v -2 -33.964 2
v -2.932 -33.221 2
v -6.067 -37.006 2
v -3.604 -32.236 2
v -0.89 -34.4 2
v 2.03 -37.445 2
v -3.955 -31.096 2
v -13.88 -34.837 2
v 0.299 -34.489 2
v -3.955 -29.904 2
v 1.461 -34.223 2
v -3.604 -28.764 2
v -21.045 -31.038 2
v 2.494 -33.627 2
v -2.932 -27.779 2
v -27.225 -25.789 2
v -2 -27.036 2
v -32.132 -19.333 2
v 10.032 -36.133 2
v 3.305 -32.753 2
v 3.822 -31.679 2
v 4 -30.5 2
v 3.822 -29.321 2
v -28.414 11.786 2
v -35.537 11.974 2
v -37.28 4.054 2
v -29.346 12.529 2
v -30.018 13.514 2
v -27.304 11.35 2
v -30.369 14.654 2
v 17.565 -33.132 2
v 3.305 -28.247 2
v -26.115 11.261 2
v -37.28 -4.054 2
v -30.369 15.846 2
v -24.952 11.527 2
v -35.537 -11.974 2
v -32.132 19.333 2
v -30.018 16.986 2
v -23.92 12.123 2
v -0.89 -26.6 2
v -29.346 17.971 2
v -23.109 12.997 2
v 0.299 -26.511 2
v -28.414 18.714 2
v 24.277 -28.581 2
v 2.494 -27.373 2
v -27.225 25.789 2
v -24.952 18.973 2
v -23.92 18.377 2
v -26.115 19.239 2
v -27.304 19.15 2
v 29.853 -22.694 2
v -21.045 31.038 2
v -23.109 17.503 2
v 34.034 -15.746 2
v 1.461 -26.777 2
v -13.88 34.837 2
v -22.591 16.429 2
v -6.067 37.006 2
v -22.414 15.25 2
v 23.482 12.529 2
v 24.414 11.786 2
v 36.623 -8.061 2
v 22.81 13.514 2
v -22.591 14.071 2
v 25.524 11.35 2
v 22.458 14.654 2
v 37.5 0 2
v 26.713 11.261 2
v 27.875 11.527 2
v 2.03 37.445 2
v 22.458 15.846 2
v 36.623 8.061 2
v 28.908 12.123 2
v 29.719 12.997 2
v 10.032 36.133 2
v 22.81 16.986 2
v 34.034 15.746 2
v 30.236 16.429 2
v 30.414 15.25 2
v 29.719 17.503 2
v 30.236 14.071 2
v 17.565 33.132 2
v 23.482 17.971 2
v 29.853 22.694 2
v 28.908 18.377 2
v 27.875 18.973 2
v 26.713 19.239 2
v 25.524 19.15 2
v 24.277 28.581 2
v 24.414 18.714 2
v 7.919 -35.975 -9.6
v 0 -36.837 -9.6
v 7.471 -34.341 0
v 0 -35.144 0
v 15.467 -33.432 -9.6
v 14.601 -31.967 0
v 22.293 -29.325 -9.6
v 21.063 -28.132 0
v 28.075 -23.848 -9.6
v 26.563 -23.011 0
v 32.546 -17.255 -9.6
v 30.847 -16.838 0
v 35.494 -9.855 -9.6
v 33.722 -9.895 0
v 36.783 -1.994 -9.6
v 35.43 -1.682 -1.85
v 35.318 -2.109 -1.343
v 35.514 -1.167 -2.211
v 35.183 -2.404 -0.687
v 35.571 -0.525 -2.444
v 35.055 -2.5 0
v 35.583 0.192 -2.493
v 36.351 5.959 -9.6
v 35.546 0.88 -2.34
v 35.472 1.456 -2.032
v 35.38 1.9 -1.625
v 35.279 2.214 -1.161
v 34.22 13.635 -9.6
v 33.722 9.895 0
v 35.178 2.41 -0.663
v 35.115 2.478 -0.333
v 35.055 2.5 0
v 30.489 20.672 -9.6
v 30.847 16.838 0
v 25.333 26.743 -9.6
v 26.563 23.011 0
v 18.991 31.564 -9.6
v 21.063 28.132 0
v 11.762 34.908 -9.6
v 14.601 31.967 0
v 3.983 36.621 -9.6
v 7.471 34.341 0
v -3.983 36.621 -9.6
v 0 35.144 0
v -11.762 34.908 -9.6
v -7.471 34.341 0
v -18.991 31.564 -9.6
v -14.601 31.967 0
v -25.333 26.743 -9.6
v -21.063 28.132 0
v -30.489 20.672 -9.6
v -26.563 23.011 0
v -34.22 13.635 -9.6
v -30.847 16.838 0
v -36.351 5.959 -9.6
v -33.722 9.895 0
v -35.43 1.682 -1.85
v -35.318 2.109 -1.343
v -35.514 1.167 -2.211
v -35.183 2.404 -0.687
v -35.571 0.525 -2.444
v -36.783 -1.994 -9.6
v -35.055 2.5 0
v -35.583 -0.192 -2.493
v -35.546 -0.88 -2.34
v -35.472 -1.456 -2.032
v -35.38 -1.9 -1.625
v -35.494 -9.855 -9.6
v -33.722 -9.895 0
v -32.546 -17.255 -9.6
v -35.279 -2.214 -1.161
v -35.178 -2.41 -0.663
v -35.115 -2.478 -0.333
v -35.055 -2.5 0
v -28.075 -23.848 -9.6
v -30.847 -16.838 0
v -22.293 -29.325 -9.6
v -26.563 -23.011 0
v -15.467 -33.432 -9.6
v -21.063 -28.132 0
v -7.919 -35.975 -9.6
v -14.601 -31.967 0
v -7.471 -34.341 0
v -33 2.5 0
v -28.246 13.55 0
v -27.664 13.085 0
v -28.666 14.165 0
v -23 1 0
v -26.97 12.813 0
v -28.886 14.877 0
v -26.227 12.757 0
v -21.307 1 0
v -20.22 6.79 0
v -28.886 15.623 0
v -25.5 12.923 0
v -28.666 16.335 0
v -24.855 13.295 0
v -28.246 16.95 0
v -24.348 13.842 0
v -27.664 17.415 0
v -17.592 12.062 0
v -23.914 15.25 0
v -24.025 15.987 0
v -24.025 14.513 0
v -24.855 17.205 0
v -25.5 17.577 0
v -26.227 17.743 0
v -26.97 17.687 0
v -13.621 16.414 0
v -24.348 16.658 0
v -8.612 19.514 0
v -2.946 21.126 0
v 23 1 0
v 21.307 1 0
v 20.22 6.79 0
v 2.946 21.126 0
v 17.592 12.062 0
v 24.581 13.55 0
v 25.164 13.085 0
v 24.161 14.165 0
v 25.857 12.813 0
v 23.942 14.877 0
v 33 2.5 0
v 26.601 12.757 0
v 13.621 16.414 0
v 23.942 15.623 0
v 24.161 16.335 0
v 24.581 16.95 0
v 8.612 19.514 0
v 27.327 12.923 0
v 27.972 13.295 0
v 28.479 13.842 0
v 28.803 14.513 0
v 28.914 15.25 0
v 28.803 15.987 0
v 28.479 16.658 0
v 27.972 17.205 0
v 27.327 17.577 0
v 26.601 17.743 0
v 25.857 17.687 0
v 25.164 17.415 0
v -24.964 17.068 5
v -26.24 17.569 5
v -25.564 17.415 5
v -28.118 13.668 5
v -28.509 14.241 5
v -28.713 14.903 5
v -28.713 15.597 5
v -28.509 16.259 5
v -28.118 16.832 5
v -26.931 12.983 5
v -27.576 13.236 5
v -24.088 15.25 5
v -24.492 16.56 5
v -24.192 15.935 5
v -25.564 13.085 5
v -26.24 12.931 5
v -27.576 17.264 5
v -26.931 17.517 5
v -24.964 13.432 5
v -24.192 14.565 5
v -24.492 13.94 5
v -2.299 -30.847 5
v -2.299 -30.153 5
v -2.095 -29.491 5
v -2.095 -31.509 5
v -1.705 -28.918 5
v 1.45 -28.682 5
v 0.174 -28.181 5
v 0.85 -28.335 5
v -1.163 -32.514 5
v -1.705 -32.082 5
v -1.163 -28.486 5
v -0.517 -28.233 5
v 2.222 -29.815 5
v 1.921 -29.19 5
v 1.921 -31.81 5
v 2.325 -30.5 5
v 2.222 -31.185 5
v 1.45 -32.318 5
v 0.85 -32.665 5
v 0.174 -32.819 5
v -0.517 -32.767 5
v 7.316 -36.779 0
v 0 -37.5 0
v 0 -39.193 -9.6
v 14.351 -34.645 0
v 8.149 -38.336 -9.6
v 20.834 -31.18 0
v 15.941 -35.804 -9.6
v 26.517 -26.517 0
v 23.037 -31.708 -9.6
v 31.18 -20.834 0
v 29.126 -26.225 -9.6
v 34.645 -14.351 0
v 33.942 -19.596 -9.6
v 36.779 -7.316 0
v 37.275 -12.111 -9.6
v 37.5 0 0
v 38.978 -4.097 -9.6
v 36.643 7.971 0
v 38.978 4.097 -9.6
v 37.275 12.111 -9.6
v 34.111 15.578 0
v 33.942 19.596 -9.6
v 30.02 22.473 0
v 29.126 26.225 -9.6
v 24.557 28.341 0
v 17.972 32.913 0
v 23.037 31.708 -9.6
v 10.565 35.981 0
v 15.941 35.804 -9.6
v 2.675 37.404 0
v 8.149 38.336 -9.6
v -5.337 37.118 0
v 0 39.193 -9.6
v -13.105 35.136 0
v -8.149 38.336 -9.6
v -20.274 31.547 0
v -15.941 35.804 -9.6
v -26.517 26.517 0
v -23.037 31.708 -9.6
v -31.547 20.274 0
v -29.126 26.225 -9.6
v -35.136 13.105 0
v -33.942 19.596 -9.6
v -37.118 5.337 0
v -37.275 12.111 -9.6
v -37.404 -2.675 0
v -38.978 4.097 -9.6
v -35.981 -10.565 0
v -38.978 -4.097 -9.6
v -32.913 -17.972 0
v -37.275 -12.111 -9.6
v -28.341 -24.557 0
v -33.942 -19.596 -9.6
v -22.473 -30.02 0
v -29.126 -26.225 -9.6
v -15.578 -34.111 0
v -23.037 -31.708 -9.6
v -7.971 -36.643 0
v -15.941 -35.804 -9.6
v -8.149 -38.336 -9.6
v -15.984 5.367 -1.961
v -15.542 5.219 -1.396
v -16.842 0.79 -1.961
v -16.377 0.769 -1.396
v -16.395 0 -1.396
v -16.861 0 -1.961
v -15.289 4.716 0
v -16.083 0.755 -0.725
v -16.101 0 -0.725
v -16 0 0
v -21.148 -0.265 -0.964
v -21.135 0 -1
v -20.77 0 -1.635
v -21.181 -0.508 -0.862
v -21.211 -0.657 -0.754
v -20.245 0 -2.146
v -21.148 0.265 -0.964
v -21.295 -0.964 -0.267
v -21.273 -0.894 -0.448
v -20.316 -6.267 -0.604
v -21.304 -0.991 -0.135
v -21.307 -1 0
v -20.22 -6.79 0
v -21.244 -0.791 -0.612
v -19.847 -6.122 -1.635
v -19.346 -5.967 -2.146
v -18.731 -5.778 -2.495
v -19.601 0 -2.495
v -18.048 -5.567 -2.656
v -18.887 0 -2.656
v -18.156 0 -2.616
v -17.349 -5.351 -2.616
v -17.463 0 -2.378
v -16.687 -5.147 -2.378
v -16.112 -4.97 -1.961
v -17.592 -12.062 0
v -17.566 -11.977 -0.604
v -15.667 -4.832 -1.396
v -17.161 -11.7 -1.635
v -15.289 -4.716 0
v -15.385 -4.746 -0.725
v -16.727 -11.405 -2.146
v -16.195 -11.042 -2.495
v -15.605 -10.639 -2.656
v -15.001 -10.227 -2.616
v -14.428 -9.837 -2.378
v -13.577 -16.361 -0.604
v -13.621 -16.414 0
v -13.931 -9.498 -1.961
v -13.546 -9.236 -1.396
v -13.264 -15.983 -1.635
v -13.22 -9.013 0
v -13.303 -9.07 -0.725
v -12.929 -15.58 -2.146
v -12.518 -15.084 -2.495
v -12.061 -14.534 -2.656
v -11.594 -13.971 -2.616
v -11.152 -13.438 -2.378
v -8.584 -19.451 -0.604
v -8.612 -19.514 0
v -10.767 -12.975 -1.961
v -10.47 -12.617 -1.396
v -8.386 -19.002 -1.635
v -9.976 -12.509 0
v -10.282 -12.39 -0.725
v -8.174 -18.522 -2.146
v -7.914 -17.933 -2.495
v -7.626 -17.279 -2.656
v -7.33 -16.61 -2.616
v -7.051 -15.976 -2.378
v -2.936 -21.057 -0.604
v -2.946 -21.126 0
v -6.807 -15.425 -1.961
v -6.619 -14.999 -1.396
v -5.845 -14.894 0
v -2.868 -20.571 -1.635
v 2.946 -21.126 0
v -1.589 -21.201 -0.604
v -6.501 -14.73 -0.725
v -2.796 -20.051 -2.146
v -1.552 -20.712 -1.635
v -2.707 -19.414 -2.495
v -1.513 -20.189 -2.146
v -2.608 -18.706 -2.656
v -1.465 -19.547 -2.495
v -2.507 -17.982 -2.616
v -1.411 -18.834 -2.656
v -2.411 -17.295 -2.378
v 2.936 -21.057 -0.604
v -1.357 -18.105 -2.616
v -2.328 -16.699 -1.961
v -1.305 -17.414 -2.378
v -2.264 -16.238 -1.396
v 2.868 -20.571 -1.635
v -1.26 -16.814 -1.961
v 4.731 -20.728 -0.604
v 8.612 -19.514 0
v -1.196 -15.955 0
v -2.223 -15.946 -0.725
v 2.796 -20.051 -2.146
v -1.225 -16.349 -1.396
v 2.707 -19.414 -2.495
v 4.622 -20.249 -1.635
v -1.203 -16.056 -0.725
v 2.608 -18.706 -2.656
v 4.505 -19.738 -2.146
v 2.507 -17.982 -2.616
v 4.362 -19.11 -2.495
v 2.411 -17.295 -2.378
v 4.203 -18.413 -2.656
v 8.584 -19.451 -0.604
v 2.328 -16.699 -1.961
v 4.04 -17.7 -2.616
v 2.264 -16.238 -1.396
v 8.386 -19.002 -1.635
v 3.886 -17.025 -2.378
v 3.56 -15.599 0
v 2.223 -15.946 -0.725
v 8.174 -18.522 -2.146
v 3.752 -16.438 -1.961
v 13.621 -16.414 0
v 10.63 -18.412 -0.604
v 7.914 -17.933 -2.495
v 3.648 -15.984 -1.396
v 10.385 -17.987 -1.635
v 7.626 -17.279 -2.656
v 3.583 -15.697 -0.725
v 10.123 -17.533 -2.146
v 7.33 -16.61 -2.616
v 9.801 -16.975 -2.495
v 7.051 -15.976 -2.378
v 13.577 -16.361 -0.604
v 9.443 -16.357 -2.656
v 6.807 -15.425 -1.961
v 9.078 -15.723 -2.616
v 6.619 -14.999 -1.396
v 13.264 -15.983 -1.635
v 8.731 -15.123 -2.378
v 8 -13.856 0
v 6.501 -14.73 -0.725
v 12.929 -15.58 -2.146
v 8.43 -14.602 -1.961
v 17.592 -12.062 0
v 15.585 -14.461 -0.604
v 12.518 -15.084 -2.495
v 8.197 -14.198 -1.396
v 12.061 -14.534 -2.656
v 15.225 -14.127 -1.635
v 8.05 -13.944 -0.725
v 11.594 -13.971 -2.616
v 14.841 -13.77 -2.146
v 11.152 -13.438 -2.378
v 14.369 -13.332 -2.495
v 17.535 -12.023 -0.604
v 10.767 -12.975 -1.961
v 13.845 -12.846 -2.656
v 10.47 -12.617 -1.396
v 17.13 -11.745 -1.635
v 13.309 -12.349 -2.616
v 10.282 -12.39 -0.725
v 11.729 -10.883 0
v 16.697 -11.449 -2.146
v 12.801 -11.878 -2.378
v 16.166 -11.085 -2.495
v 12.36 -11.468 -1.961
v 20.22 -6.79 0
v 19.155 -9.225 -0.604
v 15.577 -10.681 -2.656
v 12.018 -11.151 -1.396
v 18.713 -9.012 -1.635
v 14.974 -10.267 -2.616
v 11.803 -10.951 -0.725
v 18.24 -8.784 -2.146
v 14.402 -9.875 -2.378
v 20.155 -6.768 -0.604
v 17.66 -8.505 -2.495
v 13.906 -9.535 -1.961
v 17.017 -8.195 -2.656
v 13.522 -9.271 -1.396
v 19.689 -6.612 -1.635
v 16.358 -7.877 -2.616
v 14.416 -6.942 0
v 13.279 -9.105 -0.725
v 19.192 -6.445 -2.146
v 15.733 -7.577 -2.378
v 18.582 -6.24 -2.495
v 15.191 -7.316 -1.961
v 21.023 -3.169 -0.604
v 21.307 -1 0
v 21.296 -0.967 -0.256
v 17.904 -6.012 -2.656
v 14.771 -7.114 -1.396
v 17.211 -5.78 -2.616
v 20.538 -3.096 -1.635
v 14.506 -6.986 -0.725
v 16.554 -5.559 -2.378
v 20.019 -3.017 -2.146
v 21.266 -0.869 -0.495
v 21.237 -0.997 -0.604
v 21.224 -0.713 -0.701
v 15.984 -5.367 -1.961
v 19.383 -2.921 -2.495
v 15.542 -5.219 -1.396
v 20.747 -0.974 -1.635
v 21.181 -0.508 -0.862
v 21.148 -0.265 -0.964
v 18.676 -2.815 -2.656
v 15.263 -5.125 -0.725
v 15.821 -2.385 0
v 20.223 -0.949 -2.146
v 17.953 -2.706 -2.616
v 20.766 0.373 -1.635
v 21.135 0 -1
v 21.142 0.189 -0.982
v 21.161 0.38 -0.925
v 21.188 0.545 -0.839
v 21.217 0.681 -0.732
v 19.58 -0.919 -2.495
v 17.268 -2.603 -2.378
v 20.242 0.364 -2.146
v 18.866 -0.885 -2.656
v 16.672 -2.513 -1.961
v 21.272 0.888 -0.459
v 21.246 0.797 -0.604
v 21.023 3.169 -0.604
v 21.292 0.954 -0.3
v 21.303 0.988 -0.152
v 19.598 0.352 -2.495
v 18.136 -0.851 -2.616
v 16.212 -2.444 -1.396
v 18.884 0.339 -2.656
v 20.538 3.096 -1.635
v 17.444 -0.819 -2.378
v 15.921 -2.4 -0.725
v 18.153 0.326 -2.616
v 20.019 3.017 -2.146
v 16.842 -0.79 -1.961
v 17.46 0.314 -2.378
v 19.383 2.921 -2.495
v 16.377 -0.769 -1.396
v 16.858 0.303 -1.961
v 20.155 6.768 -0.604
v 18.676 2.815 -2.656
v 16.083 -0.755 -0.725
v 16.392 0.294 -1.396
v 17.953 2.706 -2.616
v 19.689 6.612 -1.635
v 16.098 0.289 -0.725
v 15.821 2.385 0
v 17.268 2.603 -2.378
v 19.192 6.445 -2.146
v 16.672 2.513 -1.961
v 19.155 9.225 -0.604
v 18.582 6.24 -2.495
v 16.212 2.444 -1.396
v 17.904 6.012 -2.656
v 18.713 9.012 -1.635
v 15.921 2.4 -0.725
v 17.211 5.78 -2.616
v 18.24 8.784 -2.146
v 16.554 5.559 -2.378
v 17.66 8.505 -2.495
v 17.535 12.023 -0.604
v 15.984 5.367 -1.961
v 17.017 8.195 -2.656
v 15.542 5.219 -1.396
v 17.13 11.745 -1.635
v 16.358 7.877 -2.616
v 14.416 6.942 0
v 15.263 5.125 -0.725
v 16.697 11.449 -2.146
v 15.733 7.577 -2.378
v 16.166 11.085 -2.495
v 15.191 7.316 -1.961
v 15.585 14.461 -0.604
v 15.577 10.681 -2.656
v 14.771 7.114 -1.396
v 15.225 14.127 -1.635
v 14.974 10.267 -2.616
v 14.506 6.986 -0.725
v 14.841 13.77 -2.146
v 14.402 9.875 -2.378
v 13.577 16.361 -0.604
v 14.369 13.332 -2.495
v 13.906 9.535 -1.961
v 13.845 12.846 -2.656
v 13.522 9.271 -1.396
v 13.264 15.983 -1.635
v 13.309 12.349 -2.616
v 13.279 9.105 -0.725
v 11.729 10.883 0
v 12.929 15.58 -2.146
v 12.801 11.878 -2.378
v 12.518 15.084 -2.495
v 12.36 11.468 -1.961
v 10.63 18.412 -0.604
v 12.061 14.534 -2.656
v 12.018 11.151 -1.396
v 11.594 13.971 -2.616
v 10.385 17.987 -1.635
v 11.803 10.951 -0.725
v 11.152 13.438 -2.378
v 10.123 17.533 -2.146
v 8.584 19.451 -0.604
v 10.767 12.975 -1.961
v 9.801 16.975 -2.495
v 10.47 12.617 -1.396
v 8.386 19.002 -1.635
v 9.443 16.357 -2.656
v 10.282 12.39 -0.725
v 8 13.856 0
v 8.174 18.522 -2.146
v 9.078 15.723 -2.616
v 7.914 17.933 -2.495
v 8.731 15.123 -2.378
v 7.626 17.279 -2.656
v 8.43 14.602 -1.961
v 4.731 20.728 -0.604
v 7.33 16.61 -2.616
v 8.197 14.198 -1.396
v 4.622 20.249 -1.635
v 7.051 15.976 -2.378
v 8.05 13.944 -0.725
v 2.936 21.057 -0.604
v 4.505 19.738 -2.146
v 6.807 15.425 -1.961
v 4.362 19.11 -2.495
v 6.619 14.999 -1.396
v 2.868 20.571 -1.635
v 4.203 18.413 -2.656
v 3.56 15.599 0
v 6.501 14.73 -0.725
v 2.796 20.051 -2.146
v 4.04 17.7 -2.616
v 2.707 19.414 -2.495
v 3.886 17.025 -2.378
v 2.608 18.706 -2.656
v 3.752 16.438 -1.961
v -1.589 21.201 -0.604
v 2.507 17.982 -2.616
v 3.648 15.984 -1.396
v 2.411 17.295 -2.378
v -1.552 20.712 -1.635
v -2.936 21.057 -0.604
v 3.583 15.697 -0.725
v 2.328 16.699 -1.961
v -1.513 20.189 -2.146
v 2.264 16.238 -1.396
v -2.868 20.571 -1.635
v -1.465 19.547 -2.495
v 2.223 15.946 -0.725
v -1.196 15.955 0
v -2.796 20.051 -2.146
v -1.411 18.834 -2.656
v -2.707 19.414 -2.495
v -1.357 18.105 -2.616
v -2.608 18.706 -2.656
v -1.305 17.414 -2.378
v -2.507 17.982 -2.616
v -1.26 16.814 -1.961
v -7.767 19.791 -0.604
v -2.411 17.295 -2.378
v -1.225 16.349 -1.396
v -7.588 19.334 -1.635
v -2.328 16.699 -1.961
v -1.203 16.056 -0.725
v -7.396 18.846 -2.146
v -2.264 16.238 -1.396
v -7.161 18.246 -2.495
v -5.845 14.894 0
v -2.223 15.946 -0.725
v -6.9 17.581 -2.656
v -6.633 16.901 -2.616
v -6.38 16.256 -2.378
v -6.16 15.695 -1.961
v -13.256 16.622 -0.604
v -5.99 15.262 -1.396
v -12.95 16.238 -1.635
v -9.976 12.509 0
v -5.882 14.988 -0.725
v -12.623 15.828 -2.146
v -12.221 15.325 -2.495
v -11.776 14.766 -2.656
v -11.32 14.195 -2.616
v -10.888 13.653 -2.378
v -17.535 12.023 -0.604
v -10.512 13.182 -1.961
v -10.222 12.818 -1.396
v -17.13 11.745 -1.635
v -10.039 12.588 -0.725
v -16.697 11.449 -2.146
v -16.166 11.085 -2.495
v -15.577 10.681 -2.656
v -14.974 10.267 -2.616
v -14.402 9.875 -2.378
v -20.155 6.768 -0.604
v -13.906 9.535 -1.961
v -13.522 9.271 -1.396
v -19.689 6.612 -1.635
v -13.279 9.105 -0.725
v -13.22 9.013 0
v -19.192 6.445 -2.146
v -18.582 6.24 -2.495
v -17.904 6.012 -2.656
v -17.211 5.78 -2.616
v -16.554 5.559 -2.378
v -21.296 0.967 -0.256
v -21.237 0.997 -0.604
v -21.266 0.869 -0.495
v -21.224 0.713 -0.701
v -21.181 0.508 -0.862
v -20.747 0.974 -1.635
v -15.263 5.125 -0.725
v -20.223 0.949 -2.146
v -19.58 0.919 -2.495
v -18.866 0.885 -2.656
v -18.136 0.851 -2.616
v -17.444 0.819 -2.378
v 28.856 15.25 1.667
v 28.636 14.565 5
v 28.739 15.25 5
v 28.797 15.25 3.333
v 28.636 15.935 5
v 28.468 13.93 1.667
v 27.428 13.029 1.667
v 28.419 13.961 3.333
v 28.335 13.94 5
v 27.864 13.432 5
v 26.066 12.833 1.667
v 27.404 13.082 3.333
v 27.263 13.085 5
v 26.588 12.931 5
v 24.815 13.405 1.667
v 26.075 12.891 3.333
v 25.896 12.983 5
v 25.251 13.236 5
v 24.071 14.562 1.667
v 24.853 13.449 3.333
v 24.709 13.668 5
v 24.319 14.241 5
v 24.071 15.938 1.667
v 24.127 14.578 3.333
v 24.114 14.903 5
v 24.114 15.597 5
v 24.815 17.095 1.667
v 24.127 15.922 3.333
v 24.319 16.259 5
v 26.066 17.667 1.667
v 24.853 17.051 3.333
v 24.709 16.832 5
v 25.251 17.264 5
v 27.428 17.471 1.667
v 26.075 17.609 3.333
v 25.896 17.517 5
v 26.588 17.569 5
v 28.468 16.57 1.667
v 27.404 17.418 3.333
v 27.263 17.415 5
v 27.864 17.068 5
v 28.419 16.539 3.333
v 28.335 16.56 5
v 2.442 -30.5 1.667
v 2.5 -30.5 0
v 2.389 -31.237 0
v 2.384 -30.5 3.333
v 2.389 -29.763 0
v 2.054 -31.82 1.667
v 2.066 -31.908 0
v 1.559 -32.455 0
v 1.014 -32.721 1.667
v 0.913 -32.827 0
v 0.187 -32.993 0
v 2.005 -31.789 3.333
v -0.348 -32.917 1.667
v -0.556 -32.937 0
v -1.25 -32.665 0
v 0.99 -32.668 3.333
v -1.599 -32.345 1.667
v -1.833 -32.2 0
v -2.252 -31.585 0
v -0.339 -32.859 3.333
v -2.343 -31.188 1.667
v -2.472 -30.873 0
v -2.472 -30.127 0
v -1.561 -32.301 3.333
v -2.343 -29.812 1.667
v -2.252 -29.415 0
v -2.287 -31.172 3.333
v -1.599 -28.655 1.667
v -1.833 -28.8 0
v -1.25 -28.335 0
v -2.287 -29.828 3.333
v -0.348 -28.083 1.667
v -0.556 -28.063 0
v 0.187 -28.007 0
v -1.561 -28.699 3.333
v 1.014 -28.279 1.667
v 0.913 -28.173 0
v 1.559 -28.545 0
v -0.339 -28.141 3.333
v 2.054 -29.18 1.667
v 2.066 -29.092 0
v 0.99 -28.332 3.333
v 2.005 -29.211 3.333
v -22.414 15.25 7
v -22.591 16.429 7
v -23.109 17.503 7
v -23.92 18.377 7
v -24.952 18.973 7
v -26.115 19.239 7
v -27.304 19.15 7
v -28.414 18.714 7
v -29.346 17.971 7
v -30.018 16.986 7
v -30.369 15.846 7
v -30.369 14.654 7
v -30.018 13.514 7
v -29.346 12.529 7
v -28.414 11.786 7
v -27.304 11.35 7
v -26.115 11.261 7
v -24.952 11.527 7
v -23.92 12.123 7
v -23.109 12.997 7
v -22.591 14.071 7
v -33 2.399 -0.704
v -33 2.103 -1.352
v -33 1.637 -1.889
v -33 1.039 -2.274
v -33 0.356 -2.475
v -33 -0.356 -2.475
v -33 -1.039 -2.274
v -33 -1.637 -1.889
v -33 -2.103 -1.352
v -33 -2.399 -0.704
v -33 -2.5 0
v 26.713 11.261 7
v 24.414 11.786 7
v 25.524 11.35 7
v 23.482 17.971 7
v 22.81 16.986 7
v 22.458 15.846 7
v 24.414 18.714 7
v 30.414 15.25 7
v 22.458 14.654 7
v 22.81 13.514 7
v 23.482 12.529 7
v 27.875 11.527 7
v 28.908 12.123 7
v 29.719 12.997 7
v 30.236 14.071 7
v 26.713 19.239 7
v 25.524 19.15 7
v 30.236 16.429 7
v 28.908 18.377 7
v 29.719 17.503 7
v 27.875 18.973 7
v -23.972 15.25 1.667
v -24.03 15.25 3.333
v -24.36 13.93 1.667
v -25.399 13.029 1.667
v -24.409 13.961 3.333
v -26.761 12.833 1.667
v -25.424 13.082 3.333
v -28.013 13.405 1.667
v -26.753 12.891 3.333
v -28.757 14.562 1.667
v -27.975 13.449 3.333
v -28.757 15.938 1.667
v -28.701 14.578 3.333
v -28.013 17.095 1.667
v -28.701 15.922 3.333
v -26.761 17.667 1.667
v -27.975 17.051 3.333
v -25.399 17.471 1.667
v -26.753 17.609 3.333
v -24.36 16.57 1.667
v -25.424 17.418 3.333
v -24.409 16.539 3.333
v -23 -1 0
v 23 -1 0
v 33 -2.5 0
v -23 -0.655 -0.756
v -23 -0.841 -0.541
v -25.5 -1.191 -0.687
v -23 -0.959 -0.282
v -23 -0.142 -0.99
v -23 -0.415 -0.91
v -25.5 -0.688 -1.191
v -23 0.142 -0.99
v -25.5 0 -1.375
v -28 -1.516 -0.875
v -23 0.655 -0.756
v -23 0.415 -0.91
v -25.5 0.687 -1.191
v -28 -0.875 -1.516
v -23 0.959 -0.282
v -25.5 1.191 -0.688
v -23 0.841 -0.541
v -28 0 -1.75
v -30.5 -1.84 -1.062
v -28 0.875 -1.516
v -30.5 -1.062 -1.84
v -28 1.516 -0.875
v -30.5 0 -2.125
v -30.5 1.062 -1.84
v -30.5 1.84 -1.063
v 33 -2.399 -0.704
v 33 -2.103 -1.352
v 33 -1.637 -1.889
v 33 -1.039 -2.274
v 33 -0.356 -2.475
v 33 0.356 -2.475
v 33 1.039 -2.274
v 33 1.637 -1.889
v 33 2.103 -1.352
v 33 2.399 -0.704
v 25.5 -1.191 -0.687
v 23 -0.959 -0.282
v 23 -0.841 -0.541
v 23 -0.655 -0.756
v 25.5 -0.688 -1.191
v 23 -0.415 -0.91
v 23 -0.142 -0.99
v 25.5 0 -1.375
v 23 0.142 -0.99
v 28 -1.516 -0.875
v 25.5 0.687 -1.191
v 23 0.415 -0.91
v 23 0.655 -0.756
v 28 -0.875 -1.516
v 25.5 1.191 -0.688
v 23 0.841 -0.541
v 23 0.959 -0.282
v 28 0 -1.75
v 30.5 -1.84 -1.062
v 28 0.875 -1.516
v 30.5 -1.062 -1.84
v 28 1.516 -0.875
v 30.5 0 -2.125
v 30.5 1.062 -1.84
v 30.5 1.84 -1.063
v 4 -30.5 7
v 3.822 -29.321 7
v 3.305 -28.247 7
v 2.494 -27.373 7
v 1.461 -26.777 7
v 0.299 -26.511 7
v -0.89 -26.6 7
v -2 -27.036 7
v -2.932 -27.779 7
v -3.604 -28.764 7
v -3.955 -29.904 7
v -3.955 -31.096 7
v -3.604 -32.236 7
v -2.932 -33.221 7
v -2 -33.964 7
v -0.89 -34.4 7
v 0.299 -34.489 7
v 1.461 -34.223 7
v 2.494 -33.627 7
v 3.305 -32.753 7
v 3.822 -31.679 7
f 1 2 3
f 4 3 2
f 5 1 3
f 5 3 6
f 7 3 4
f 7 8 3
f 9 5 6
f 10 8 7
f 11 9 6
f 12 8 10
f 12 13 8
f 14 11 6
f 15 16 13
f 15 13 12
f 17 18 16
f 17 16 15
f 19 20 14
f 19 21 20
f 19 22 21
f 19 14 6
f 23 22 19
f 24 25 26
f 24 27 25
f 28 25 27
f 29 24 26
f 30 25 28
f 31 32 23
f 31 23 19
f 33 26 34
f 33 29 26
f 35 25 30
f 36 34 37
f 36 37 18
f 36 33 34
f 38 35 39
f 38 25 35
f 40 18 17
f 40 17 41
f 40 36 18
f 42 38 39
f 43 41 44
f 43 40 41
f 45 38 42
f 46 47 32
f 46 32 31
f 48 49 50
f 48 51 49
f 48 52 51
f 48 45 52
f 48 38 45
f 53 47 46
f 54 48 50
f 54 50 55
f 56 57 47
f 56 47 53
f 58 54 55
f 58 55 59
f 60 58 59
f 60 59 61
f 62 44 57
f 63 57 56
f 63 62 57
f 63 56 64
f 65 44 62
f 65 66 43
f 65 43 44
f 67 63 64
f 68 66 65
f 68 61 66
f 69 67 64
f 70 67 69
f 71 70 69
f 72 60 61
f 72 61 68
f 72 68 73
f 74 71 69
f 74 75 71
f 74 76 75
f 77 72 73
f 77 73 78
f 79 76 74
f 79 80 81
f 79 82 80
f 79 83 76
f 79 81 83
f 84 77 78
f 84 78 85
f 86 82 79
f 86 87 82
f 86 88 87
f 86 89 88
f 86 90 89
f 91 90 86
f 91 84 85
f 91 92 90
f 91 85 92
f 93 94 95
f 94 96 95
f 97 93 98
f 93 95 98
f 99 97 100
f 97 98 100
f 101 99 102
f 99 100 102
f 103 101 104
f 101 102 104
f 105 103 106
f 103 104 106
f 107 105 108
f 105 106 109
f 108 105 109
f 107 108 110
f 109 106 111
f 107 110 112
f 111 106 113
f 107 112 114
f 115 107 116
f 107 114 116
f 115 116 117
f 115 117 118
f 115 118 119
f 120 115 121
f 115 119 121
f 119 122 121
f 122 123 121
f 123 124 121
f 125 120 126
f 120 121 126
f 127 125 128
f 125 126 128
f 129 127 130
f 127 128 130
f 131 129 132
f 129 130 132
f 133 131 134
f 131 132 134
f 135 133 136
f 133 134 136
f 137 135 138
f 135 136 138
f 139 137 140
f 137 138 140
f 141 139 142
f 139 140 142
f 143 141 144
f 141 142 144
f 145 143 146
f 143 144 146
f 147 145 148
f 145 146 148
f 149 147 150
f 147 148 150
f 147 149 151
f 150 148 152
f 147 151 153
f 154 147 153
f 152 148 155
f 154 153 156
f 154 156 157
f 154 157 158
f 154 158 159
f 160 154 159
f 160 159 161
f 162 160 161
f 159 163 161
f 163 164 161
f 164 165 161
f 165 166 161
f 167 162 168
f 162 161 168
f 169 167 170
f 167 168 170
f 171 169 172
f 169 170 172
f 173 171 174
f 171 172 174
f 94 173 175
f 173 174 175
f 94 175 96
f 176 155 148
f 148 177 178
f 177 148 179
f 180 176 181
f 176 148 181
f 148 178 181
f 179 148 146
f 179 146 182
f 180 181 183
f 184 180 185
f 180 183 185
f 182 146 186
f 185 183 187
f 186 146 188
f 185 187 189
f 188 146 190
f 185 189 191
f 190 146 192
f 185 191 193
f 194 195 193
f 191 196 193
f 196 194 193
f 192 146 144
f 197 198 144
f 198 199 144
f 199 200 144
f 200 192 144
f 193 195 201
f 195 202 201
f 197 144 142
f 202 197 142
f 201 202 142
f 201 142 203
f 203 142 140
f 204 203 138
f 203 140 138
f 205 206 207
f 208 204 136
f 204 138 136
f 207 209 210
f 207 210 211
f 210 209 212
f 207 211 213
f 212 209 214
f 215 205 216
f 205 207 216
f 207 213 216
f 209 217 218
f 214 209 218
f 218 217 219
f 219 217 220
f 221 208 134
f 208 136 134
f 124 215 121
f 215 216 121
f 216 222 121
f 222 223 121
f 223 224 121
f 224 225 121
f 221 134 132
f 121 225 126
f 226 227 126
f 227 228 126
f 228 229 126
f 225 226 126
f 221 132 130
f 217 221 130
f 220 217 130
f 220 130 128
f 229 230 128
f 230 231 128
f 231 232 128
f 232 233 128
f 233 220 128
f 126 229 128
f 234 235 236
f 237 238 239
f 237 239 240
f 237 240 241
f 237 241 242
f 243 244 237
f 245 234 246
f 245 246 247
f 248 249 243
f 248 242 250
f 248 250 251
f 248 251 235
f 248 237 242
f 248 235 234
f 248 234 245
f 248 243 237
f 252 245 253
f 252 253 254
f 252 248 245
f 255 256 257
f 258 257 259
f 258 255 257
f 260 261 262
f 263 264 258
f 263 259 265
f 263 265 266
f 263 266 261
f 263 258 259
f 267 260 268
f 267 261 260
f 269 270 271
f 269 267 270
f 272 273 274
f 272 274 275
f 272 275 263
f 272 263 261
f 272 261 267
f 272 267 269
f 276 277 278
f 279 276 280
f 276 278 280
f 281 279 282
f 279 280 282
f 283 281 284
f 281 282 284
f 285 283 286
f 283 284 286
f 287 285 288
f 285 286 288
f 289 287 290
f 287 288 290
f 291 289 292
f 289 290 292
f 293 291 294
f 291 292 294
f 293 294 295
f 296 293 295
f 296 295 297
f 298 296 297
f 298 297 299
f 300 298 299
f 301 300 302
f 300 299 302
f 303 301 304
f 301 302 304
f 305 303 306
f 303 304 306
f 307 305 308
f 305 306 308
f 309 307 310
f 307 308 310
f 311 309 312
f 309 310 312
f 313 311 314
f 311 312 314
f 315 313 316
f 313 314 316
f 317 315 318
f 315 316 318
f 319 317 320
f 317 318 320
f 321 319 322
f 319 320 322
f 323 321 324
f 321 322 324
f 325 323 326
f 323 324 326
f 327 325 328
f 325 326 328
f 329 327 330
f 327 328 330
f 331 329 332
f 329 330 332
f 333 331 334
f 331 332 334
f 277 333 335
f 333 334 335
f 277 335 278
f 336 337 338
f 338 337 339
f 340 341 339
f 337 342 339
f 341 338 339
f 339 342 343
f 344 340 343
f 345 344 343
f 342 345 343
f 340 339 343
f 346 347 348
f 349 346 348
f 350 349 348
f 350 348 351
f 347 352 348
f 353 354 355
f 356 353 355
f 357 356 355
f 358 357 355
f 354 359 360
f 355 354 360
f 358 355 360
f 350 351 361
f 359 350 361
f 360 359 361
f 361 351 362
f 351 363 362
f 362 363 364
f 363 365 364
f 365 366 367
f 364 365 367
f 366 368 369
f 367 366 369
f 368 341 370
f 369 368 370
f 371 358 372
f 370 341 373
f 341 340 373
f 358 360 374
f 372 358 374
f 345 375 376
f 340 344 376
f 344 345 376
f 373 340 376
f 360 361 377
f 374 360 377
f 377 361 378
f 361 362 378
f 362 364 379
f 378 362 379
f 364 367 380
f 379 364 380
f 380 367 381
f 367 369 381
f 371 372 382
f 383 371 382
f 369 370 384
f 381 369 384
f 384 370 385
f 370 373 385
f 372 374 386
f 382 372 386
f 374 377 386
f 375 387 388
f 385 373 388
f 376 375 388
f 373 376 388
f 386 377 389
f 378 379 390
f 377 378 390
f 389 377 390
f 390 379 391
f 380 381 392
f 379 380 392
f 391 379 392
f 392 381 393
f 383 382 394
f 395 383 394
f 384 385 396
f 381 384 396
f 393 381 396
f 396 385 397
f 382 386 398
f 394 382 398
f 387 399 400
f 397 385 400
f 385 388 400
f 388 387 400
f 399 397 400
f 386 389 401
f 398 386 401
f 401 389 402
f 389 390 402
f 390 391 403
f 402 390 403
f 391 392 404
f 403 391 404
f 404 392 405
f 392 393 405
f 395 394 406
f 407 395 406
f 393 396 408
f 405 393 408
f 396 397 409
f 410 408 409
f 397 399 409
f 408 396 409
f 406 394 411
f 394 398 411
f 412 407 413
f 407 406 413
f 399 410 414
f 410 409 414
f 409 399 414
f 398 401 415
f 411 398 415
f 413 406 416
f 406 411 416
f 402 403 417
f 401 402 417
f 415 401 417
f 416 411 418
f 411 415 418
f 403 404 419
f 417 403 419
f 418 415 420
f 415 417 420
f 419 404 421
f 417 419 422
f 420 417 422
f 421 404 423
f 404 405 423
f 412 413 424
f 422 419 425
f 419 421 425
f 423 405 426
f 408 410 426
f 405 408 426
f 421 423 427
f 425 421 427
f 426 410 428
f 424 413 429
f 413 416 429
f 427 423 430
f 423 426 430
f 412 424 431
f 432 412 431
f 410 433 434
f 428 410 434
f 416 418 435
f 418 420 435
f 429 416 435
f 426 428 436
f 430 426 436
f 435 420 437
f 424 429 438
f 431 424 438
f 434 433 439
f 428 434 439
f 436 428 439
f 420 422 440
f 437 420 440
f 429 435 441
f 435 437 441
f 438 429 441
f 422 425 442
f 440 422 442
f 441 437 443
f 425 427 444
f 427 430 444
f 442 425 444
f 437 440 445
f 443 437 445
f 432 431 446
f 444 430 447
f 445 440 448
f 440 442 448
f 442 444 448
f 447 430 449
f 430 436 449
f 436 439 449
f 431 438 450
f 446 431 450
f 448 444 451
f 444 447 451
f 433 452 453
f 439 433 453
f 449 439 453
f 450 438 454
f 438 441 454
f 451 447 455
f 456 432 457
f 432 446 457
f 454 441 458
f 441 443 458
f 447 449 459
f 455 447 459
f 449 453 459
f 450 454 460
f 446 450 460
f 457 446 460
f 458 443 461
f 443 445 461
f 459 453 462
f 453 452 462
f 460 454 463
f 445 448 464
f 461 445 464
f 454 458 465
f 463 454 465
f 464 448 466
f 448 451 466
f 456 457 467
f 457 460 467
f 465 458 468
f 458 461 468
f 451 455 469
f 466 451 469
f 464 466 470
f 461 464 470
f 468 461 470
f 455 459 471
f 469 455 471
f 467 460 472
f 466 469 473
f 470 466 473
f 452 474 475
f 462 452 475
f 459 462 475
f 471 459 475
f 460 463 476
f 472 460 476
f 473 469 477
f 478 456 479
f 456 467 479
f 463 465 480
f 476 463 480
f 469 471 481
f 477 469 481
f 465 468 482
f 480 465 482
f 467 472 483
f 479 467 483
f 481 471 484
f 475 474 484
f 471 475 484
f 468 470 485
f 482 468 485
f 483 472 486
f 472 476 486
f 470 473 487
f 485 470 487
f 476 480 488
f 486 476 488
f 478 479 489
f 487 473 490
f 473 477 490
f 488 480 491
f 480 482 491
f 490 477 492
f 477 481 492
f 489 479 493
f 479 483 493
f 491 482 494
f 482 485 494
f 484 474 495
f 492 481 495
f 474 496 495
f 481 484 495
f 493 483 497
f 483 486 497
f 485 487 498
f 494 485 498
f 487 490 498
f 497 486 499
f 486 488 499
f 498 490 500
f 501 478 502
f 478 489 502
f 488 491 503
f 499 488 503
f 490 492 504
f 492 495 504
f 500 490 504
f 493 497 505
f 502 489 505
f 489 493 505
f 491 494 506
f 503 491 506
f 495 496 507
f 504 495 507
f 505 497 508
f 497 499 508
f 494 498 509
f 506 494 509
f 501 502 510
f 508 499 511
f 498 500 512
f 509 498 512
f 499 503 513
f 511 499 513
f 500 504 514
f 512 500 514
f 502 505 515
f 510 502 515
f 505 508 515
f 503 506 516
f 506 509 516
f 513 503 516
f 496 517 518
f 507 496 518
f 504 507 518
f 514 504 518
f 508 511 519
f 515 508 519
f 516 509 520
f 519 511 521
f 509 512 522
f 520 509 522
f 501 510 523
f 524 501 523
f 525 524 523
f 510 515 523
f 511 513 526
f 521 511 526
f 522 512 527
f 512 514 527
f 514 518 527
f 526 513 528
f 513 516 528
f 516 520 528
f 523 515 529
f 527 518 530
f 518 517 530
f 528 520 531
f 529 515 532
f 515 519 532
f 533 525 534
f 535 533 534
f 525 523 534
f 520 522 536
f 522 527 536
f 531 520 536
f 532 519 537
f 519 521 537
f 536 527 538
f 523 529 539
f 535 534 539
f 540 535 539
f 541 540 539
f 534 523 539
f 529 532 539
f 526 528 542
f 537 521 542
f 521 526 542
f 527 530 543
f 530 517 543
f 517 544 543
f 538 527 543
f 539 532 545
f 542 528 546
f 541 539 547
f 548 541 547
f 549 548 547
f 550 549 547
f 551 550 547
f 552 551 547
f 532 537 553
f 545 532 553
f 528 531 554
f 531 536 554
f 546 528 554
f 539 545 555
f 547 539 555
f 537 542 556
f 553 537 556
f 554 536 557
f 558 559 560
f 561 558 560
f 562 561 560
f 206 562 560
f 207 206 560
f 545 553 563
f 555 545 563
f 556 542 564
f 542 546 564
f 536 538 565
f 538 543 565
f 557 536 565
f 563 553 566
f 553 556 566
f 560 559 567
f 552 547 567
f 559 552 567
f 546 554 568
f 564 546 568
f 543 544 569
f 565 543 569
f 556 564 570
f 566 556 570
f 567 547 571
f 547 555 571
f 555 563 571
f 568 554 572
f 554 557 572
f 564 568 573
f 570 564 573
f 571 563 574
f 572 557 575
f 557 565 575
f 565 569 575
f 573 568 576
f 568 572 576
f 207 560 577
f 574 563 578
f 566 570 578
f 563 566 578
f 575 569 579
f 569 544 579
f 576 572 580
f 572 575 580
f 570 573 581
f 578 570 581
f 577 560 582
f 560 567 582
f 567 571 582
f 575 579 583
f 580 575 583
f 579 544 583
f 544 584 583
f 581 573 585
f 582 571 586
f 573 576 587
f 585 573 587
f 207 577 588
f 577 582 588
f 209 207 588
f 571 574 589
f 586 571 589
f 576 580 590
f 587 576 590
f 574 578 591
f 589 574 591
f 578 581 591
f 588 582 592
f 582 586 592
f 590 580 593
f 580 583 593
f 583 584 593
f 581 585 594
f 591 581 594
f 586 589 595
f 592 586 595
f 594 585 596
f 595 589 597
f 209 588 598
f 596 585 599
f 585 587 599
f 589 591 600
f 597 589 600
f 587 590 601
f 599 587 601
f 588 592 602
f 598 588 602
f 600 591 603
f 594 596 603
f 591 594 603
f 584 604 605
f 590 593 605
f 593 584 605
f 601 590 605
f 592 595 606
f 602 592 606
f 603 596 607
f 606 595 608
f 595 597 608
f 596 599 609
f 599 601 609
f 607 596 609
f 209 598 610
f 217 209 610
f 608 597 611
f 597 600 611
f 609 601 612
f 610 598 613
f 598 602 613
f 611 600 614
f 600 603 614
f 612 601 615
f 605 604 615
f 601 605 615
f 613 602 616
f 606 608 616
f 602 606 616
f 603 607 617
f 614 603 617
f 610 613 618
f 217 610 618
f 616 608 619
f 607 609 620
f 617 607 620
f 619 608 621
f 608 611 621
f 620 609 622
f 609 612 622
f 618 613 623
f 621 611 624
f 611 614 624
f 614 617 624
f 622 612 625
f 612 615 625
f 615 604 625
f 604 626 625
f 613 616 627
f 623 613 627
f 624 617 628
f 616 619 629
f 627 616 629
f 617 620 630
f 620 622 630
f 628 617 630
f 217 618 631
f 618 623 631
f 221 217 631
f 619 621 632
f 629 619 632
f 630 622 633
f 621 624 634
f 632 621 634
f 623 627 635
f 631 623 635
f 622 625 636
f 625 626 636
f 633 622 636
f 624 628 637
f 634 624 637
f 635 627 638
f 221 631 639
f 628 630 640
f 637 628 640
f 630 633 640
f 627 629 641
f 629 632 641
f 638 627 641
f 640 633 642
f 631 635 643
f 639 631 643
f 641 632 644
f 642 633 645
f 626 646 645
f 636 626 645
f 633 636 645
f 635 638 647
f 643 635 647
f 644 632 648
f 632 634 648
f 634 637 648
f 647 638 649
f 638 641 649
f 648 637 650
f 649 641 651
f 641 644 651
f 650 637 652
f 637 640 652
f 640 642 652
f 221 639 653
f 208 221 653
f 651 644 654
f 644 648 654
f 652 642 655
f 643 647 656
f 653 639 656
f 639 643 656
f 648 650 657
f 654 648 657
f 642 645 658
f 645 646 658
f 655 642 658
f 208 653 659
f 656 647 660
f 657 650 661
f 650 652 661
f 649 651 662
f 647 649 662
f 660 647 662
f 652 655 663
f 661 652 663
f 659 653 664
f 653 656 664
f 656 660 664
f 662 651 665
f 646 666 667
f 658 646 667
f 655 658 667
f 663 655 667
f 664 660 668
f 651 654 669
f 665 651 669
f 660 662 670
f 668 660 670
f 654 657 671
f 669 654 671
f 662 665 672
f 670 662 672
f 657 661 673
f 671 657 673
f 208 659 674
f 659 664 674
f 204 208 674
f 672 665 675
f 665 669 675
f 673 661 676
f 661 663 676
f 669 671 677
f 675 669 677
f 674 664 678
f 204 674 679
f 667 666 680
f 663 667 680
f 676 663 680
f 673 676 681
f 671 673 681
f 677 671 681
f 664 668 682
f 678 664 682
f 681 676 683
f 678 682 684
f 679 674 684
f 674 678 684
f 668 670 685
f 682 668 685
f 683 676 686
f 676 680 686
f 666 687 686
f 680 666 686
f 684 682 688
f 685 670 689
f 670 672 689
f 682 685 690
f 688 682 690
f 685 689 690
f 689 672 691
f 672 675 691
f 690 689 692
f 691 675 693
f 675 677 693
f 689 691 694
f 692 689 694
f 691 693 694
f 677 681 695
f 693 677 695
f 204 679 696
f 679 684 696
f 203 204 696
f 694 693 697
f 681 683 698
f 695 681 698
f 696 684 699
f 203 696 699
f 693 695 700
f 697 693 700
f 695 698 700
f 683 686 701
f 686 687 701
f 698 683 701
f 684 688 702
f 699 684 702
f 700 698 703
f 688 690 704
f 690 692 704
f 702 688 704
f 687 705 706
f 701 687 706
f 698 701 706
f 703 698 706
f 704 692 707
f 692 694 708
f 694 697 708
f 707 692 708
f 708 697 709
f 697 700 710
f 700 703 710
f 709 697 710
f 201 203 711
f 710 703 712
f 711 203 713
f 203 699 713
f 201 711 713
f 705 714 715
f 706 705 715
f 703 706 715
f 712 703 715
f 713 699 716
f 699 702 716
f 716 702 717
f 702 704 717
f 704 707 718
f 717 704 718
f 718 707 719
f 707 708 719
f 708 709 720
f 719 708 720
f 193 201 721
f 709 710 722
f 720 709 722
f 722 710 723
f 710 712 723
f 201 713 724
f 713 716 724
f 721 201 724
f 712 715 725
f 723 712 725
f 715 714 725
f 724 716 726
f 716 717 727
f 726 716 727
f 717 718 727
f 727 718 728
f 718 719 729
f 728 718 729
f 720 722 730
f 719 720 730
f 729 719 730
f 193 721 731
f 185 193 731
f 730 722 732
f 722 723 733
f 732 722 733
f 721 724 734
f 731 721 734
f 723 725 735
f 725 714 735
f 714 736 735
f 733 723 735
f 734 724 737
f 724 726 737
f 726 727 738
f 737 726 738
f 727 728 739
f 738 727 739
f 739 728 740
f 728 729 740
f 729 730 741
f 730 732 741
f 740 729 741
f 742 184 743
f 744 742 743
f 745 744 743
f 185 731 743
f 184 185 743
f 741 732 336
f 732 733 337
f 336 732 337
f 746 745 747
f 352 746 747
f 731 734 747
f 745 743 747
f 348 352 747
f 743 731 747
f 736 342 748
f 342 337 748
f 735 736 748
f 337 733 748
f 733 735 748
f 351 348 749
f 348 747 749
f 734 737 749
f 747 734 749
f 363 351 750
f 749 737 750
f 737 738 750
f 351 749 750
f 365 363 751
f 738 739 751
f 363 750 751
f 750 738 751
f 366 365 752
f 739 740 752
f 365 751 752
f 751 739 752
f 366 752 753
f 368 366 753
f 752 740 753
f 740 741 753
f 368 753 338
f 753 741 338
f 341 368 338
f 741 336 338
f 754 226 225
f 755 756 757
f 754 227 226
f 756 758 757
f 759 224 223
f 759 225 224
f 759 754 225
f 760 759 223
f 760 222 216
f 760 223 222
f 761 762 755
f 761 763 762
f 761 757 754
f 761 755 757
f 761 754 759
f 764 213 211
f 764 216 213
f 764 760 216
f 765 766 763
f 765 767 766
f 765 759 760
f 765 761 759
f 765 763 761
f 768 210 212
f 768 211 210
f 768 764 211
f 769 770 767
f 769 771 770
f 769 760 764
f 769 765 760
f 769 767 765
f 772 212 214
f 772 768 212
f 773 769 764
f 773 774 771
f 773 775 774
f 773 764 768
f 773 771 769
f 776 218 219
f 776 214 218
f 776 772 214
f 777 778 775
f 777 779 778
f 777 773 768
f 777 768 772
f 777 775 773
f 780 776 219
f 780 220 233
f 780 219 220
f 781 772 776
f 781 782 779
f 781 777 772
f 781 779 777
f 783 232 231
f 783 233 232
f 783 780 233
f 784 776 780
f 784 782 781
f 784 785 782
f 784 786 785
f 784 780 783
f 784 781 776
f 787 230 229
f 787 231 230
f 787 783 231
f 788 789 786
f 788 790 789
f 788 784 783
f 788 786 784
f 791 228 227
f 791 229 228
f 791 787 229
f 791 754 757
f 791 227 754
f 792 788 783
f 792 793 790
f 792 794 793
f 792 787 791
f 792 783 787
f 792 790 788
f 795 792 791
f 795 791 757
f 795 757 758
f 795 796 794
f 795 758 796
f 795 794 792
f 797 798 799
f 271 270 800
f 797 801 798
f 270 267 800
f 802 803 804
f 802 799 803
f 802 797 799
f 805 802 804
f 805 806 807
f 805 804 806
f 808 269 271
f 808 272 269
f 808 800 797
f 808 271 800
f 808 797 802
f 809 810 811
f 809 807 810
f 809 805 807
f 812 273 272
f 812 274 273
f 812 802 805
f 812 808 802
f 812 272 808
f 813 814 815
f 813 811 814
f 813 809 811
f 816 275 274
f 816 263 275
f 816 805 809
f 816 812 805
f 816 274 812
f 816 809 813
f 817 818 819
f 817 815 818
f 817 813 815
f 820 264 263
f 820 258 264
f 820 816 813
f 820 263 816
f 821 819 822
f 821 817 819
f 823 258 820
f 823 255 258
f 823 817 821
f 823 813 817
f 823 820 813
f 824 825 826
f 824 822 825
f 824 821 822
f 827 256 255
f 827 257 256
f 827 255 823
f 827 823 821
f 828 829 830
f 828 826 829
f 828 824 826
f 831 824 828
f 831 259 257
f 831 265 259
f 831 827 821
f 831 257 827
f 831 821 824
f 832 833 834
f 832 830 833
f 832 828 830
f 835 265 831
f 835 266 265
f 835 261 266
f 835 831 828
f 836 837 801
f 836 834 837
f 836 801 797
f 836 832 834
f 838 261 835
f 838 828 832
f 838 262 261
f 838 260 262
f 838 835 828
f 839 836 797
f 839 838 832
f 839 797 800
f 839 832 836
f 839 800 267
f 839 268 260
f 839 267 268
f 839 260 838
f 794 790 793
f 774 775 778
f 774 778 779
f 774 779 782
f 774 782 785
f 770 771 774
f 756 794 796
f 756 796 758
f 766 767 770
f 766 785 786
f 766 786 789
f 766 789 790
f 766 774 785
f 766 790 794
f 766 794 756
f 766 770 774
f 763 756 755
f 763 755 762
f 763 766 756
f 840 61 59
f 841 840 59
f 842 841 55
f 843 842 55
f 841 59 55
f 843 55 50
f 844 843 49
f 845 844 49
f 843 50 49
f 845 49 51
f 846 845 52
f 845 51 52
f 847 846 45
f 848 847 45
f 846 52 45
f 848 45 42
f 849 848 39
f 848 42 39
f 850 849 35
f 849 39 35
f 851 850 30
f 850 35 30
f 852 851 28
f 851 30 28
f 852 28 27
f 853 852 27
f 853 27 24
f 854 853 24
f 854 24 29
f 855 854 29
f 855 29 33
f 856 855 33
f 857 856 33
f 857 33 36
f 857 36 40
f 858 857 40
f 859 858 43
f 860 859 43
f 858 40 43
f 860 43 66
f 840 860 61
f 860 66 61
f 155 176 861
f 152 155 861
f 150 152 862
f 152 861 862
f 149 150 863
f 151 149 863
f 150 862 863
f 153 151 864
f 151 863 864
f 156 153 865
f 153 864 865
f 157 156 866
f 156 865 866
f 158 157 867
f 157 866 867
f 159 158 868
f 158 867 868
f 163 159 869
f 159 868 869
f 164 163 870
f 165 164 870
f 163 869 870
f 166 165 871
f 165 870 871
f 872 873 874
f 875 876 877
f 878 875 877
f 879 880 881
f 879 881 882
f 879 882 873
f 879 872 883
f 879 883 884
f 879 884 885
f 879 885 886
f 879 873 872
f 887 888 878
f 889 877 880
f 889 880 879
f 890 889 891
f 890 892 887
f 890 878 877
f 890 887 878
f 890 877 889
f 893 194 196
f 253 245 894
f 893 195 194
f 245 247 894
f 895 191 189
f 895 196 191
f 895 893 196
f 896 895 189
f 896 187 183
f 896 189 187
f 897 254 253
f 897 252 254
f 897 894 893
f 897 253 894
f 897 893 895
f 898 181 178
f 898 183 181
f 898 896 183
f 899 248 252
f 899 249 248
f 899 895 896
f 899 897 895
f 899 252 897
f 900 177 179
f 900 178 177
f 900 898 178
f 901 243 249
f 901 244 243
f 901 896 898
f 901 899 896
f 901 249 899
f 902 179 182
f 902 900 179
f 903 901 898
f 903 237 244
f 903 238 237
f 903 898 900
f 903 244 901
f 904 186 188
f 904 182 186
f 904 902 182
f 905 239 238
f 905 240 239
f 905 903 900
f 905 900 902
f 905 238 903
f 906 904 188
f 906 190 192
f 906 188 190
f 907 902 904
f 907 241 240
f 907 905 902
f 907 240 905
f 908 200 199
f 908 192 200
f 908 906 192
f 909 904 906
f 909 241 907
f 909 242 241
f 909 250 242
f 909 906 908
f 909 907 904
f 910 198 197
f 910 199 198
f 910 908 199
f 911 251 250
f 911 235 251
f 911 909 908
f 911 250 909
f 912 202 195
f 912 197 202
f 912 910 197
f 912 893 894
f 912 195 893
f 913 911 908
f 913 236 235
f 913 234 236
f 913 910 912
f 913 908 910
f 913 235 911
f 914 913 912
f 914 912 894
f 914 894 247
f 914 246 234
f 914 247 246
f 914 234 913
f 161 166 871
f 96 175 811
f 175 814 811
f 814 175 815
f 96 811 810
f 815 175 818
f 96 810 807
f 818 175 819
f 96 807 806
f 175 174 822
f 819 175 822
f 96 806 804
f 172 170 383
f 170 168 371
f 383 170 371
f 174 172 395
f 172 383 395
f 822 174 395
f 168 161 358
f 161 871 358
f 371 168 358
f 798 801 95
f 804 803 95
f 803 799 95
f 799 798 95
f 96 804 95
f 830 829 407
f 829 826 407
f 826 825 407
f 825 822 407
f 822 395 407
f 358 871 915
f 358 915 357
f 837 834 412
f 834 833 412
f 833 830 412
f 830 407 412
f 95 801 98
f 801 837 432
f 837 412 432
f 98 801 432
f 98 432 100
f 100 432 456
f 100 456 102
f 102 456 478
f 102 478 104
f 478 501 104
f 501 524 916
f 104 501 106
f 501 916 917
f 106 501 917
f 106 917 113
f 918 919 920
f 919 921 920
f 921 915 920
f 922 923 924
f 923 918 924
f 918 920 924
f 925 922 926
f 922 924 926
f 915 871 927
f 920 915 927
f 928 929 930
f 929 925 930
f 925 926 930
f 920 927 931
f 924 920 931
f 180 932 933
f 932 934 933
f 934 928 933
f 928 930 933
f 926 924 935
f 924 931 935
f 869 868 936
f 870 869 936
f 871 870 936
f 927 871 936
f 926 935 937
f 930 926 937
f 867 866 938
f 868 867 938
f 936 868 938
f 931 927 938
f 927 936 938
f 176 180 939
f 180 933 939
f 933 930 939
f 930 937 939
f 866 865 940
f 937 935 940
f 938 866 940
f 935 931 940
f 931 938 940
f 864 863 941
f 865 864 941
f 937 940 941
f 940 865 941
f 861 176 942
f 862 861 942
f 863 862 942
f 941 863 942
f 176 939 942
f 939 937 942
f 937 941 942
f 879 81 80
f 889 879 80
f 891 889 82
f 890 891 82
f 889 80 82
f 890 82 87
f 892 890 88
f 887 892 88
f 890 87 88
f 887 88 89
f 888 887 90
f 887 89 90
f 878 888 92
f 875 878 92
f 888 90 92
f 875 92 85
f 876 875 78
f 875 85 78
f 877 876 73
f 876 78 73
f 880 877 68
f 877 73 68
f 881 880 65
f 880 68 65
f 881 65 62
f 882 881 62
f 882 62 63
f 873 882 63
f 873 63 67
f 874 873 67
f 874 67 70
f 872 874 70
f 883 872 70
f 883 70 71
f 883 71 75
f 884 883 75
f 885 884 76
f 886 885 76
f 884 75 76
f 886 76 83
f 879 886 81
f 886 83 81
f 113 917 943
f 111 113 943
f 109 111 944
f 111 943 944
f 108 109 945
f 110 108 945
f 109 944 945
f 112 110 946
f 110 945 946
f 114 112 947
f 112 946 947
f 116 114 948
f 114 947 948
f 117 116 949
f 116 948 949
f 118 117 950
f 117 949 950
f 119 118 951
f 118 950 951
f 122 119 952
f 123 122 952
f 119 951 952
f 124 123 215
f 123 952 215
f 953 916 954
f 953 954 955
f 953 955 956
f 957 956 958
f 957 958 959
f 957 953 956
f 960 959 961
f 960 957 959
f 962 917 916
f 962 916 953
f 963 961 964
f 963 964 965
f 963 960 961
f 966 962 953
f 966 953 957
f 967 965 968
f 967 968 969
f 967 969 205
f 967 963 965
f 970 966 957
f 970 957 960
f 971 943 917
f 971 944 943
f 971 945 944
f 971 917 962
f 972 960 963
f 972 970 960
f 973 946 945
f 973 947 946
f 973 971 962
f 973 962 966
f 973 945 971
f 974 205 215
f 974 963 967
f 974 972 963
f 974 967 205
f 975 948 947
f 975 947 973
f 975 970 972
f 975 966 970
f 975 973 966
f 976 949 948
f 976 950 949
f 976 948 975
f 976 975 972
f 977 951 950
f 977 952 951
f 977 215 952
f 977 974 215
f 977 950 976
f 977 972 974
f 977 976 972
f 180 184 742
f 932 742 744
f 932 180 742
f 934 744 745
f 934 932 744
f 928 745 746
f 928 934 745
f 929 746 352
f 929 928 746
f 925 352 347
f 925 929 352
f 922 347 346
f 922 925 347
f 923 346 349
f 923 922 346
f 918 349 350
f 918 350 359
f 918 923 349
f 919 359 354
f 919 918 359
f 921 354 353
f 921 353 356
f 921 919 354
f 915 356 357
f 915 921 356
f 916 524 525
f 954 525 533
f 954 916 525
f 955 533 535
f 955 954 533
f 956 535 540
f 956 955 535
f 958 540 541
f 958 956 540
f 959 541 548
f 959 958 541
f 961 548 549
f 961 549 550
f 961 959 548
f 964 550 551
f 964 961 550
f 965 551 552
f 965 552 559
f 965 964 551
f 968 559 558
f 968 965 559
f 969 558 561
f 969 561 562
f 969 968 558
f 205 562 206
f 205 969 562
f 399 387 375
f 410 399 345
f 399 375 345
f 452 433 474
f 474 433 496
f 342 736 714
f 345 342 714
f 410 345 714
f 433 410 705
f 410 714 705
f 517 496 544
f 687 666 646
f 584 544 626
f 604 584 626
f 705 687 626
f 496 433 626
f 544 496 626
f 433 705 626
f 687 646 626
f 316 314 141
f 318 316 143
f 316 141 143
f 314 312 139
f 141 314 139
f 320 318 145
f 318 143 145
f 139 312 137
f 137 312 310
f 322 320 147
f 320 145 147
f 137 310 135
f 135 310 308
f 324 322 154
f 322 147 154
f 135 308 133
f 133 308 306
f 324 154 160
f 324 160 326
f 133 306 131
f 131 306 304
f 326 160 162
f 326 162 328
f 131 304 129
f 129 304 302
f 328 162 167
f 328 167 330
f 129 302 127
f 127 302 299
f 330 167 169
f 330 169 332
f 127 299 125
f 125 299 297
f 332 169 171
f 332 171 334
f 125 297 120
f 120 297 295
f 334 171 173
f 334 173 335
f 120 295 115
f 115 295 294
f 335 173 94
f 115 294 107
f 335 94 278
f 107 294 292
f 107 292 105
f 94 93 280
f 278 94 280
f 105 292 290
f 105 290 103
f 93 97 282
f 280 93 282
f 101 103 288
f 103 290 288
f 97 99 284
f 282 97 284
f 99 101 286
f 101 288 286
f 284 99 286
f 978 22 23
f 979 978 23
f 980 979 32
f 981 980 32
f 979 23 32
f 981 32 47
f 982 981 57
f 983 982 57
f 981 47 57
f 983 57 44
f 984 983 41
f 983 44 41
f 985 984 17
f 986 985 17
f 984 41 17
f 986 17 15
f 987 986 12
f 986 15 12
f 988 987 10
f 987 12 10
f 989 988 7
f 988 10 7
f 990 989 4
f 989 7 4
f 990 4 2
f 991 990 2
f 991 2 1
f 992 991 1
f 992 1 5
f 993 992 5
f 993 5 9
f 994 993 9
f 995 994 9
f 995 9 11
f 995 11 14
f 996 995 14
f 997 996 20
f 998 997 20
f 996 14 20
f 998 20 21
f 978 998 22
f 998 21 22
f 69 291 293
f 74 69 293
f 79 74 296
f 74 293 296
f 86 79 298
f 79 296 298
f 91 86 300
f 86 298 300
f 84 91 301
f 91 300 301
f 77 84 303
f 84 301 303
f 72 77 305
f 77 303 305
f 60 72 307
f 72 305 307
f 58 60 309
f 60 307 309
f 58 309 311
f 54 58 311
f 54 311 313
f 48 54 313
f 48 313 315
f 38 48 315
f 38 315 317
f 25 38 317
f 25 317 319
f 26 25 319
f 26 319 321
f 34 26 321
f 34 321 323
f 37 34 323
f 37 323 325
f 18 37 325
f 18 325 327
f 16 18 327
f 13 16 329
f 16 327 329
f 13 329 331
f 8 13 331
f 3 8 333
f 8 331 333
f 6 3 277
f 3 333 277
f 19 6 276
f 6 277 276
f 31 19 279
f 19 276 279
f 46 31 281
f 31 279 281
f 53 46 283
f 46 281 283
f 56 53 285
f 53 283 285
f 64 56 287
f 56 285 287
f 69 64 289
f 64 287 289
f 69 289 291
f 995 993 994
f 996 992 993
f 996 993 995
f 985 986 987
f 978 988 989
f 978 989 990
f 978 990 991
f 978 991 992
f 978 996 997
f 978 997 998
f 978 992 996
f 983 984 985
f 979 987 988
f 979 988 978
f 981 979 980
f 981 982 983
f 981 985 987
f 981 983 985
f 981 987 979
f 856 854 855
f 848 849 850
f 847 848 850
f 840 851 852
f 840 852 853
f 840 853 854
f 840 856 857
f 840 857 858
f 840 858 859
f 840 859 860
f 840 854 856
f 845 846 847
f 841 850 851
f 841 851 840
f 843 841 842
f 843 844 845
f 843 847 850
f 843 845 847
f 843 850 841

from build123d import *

# Parameters (mm, degrees)
F3_R             = 37.5
F4_DEPTH         = 2
F8_R             = 4
F9_DEPTH         = 5
F7_R             = 2.5
F10_DEPTH        = 5
F10_TAPER        = 2
F14_COPIES_COUNT = 2
F16_COPIES_COUNT = 2


# Not quite as in the source:
# - a pattern or mirror of a feature is missing from the dataset's text; its kind, count and spacing are read off the source's solid


with BuildPart() as f2:
    # F1 (on Front) → F2 (revolve)
    with BuildSketch(Plane.XZ):
        with BuildLine():
            Line((-16, 0), (-21.33, 0))
            ThreePointArc((-21.33, 0), (-18.665, -2.665), (-16, 0))
        make_face()
    revolve(axis=Axis((0, 0, 18.396249041), (0, 0, 1)))

    # F3 (on face) → F4 (join)
    with BuildSketch(Plane.XY):
        Circle(F3_R)
    extrude(amount=F4_DEPTH)

    # F5 (on Right) → F6 (revolve)
    with BuildSketch(Plane.YZ):
        Polygon((-36.8366060944, -9.6), (-35.1438670796, 0), (-37.5, 0), (-39.1927390148, -9.6), align=None)
    revolve(axis=Axis((0, 0, 18.396249041), (0, 0, 1)))

    # F8 (on face) → F9 (join)
    with BuildSketch(Plane.XY.offset(2)):
        with Locations((0, -30.5)):
            Circle(F8_R)
        with Locations((26.4137748154, 15.25)):
            Circle(F8_R)
        with Locations((-26.4137748154, 15.25)):
            Circle(F8_R)
    extrude(amount=F9_DEPTH)

    # F7 (on face) → F10 (cut)
    with BuildSketch(Plane(origin=(0, 0, 0), x_dir=(1, 0, 0), z_dir=(0, 0, -1))):
        with Locations((0, 30.5)):
            Circle(F7_R)
        with Locations((-26.4137748154, -15.25)):
            Circle(F7_R)
        with Locations((26.4137748154, -15.25)):
            Circle(F7_R)
    extrude(amount=-F10_DEPTH, taper=F10_TAPER, mode=Mode.SUBTRACT)

    # F13 (on offset) → F14 (join, up to the next surface of F2)
    with BuildSketch(Plane.YZ.offset(33)):
        with BuildLine():
            Line((2.5, 0), (-2.5, 0))
            ThreePointArc((-2.5, 0), (0, -2.5), (2.5, 0))
        make_face()
    f14 = extrude(until=Until.NEXT)

    # F14_copies: F14 ×2 about axis
    f14_copies_axis = Axis((0, 0, 0), (0, 0, 1))
    for i in range(1, F14_COPIES_COUNT):
        add(f14.rotate(f14_copies_axis, i * 360 / F14_COPIES_COUNT))

    # F15 (on offset) → F16 (join, up to the next surface of F2)
    with BuildSketch(Plane.YZ.offset(23)):
        with BuildLine():
            Line((1, 0), (-1, 0))
            ThreePointArc((-1, 0), (0, -1), (1, 0))
        make_face()
    f16 = extrude(until=Until.NEXT, dir=(-1, 0, 0))

    # F16_copies: F16 ×2 about axis
    f16_copies_axis = Axis((0, 0, 0), (0, 0, 1))
    for i in range(1, F16_COPIES_COUNT):
        add(f16.rotate(f16_copies_axis, i * 360 / F16_COPIES_COUNT))

    # F16_face (on face) → F17 section 0
    with BuildSketch(Plane(origin=(23, 0, -0.4244131816), x_dir=(0, 1, 0), z_dir=(1, 0, 0))):
        with BuildLine():
            Line((1, 0.4244131816), (-1, 0.4244131816))
            ThreePointArc((-1, 0.4244131816), (0, -0.5755868184), (1, 0.4244131816))
        make_face()
    # F14_face (on face) → F17 section 1
    with BuildSketch(Plane(origin=(33, 0, -1.0610329539), x_dir=(0, 1, 0), z_dir=(-1, 0, 0))):
        with BuildLine():
            Line((-2.5, -1.0610329539), (2.5, -1.0610329539))
            ThreePointArc((2.5, -1.0610329539), (0, 1.4389670461), (-2.5, -1.0610329539))
        make_face()
    f17 = loft()

    # F17_copies: F17 across plane
    add(f17.mirror(Plane(origin=(0, 0, 0), x_dir=(0, 0, -1), z_dir=(-1, 0, 0))))


solid = f2.part
